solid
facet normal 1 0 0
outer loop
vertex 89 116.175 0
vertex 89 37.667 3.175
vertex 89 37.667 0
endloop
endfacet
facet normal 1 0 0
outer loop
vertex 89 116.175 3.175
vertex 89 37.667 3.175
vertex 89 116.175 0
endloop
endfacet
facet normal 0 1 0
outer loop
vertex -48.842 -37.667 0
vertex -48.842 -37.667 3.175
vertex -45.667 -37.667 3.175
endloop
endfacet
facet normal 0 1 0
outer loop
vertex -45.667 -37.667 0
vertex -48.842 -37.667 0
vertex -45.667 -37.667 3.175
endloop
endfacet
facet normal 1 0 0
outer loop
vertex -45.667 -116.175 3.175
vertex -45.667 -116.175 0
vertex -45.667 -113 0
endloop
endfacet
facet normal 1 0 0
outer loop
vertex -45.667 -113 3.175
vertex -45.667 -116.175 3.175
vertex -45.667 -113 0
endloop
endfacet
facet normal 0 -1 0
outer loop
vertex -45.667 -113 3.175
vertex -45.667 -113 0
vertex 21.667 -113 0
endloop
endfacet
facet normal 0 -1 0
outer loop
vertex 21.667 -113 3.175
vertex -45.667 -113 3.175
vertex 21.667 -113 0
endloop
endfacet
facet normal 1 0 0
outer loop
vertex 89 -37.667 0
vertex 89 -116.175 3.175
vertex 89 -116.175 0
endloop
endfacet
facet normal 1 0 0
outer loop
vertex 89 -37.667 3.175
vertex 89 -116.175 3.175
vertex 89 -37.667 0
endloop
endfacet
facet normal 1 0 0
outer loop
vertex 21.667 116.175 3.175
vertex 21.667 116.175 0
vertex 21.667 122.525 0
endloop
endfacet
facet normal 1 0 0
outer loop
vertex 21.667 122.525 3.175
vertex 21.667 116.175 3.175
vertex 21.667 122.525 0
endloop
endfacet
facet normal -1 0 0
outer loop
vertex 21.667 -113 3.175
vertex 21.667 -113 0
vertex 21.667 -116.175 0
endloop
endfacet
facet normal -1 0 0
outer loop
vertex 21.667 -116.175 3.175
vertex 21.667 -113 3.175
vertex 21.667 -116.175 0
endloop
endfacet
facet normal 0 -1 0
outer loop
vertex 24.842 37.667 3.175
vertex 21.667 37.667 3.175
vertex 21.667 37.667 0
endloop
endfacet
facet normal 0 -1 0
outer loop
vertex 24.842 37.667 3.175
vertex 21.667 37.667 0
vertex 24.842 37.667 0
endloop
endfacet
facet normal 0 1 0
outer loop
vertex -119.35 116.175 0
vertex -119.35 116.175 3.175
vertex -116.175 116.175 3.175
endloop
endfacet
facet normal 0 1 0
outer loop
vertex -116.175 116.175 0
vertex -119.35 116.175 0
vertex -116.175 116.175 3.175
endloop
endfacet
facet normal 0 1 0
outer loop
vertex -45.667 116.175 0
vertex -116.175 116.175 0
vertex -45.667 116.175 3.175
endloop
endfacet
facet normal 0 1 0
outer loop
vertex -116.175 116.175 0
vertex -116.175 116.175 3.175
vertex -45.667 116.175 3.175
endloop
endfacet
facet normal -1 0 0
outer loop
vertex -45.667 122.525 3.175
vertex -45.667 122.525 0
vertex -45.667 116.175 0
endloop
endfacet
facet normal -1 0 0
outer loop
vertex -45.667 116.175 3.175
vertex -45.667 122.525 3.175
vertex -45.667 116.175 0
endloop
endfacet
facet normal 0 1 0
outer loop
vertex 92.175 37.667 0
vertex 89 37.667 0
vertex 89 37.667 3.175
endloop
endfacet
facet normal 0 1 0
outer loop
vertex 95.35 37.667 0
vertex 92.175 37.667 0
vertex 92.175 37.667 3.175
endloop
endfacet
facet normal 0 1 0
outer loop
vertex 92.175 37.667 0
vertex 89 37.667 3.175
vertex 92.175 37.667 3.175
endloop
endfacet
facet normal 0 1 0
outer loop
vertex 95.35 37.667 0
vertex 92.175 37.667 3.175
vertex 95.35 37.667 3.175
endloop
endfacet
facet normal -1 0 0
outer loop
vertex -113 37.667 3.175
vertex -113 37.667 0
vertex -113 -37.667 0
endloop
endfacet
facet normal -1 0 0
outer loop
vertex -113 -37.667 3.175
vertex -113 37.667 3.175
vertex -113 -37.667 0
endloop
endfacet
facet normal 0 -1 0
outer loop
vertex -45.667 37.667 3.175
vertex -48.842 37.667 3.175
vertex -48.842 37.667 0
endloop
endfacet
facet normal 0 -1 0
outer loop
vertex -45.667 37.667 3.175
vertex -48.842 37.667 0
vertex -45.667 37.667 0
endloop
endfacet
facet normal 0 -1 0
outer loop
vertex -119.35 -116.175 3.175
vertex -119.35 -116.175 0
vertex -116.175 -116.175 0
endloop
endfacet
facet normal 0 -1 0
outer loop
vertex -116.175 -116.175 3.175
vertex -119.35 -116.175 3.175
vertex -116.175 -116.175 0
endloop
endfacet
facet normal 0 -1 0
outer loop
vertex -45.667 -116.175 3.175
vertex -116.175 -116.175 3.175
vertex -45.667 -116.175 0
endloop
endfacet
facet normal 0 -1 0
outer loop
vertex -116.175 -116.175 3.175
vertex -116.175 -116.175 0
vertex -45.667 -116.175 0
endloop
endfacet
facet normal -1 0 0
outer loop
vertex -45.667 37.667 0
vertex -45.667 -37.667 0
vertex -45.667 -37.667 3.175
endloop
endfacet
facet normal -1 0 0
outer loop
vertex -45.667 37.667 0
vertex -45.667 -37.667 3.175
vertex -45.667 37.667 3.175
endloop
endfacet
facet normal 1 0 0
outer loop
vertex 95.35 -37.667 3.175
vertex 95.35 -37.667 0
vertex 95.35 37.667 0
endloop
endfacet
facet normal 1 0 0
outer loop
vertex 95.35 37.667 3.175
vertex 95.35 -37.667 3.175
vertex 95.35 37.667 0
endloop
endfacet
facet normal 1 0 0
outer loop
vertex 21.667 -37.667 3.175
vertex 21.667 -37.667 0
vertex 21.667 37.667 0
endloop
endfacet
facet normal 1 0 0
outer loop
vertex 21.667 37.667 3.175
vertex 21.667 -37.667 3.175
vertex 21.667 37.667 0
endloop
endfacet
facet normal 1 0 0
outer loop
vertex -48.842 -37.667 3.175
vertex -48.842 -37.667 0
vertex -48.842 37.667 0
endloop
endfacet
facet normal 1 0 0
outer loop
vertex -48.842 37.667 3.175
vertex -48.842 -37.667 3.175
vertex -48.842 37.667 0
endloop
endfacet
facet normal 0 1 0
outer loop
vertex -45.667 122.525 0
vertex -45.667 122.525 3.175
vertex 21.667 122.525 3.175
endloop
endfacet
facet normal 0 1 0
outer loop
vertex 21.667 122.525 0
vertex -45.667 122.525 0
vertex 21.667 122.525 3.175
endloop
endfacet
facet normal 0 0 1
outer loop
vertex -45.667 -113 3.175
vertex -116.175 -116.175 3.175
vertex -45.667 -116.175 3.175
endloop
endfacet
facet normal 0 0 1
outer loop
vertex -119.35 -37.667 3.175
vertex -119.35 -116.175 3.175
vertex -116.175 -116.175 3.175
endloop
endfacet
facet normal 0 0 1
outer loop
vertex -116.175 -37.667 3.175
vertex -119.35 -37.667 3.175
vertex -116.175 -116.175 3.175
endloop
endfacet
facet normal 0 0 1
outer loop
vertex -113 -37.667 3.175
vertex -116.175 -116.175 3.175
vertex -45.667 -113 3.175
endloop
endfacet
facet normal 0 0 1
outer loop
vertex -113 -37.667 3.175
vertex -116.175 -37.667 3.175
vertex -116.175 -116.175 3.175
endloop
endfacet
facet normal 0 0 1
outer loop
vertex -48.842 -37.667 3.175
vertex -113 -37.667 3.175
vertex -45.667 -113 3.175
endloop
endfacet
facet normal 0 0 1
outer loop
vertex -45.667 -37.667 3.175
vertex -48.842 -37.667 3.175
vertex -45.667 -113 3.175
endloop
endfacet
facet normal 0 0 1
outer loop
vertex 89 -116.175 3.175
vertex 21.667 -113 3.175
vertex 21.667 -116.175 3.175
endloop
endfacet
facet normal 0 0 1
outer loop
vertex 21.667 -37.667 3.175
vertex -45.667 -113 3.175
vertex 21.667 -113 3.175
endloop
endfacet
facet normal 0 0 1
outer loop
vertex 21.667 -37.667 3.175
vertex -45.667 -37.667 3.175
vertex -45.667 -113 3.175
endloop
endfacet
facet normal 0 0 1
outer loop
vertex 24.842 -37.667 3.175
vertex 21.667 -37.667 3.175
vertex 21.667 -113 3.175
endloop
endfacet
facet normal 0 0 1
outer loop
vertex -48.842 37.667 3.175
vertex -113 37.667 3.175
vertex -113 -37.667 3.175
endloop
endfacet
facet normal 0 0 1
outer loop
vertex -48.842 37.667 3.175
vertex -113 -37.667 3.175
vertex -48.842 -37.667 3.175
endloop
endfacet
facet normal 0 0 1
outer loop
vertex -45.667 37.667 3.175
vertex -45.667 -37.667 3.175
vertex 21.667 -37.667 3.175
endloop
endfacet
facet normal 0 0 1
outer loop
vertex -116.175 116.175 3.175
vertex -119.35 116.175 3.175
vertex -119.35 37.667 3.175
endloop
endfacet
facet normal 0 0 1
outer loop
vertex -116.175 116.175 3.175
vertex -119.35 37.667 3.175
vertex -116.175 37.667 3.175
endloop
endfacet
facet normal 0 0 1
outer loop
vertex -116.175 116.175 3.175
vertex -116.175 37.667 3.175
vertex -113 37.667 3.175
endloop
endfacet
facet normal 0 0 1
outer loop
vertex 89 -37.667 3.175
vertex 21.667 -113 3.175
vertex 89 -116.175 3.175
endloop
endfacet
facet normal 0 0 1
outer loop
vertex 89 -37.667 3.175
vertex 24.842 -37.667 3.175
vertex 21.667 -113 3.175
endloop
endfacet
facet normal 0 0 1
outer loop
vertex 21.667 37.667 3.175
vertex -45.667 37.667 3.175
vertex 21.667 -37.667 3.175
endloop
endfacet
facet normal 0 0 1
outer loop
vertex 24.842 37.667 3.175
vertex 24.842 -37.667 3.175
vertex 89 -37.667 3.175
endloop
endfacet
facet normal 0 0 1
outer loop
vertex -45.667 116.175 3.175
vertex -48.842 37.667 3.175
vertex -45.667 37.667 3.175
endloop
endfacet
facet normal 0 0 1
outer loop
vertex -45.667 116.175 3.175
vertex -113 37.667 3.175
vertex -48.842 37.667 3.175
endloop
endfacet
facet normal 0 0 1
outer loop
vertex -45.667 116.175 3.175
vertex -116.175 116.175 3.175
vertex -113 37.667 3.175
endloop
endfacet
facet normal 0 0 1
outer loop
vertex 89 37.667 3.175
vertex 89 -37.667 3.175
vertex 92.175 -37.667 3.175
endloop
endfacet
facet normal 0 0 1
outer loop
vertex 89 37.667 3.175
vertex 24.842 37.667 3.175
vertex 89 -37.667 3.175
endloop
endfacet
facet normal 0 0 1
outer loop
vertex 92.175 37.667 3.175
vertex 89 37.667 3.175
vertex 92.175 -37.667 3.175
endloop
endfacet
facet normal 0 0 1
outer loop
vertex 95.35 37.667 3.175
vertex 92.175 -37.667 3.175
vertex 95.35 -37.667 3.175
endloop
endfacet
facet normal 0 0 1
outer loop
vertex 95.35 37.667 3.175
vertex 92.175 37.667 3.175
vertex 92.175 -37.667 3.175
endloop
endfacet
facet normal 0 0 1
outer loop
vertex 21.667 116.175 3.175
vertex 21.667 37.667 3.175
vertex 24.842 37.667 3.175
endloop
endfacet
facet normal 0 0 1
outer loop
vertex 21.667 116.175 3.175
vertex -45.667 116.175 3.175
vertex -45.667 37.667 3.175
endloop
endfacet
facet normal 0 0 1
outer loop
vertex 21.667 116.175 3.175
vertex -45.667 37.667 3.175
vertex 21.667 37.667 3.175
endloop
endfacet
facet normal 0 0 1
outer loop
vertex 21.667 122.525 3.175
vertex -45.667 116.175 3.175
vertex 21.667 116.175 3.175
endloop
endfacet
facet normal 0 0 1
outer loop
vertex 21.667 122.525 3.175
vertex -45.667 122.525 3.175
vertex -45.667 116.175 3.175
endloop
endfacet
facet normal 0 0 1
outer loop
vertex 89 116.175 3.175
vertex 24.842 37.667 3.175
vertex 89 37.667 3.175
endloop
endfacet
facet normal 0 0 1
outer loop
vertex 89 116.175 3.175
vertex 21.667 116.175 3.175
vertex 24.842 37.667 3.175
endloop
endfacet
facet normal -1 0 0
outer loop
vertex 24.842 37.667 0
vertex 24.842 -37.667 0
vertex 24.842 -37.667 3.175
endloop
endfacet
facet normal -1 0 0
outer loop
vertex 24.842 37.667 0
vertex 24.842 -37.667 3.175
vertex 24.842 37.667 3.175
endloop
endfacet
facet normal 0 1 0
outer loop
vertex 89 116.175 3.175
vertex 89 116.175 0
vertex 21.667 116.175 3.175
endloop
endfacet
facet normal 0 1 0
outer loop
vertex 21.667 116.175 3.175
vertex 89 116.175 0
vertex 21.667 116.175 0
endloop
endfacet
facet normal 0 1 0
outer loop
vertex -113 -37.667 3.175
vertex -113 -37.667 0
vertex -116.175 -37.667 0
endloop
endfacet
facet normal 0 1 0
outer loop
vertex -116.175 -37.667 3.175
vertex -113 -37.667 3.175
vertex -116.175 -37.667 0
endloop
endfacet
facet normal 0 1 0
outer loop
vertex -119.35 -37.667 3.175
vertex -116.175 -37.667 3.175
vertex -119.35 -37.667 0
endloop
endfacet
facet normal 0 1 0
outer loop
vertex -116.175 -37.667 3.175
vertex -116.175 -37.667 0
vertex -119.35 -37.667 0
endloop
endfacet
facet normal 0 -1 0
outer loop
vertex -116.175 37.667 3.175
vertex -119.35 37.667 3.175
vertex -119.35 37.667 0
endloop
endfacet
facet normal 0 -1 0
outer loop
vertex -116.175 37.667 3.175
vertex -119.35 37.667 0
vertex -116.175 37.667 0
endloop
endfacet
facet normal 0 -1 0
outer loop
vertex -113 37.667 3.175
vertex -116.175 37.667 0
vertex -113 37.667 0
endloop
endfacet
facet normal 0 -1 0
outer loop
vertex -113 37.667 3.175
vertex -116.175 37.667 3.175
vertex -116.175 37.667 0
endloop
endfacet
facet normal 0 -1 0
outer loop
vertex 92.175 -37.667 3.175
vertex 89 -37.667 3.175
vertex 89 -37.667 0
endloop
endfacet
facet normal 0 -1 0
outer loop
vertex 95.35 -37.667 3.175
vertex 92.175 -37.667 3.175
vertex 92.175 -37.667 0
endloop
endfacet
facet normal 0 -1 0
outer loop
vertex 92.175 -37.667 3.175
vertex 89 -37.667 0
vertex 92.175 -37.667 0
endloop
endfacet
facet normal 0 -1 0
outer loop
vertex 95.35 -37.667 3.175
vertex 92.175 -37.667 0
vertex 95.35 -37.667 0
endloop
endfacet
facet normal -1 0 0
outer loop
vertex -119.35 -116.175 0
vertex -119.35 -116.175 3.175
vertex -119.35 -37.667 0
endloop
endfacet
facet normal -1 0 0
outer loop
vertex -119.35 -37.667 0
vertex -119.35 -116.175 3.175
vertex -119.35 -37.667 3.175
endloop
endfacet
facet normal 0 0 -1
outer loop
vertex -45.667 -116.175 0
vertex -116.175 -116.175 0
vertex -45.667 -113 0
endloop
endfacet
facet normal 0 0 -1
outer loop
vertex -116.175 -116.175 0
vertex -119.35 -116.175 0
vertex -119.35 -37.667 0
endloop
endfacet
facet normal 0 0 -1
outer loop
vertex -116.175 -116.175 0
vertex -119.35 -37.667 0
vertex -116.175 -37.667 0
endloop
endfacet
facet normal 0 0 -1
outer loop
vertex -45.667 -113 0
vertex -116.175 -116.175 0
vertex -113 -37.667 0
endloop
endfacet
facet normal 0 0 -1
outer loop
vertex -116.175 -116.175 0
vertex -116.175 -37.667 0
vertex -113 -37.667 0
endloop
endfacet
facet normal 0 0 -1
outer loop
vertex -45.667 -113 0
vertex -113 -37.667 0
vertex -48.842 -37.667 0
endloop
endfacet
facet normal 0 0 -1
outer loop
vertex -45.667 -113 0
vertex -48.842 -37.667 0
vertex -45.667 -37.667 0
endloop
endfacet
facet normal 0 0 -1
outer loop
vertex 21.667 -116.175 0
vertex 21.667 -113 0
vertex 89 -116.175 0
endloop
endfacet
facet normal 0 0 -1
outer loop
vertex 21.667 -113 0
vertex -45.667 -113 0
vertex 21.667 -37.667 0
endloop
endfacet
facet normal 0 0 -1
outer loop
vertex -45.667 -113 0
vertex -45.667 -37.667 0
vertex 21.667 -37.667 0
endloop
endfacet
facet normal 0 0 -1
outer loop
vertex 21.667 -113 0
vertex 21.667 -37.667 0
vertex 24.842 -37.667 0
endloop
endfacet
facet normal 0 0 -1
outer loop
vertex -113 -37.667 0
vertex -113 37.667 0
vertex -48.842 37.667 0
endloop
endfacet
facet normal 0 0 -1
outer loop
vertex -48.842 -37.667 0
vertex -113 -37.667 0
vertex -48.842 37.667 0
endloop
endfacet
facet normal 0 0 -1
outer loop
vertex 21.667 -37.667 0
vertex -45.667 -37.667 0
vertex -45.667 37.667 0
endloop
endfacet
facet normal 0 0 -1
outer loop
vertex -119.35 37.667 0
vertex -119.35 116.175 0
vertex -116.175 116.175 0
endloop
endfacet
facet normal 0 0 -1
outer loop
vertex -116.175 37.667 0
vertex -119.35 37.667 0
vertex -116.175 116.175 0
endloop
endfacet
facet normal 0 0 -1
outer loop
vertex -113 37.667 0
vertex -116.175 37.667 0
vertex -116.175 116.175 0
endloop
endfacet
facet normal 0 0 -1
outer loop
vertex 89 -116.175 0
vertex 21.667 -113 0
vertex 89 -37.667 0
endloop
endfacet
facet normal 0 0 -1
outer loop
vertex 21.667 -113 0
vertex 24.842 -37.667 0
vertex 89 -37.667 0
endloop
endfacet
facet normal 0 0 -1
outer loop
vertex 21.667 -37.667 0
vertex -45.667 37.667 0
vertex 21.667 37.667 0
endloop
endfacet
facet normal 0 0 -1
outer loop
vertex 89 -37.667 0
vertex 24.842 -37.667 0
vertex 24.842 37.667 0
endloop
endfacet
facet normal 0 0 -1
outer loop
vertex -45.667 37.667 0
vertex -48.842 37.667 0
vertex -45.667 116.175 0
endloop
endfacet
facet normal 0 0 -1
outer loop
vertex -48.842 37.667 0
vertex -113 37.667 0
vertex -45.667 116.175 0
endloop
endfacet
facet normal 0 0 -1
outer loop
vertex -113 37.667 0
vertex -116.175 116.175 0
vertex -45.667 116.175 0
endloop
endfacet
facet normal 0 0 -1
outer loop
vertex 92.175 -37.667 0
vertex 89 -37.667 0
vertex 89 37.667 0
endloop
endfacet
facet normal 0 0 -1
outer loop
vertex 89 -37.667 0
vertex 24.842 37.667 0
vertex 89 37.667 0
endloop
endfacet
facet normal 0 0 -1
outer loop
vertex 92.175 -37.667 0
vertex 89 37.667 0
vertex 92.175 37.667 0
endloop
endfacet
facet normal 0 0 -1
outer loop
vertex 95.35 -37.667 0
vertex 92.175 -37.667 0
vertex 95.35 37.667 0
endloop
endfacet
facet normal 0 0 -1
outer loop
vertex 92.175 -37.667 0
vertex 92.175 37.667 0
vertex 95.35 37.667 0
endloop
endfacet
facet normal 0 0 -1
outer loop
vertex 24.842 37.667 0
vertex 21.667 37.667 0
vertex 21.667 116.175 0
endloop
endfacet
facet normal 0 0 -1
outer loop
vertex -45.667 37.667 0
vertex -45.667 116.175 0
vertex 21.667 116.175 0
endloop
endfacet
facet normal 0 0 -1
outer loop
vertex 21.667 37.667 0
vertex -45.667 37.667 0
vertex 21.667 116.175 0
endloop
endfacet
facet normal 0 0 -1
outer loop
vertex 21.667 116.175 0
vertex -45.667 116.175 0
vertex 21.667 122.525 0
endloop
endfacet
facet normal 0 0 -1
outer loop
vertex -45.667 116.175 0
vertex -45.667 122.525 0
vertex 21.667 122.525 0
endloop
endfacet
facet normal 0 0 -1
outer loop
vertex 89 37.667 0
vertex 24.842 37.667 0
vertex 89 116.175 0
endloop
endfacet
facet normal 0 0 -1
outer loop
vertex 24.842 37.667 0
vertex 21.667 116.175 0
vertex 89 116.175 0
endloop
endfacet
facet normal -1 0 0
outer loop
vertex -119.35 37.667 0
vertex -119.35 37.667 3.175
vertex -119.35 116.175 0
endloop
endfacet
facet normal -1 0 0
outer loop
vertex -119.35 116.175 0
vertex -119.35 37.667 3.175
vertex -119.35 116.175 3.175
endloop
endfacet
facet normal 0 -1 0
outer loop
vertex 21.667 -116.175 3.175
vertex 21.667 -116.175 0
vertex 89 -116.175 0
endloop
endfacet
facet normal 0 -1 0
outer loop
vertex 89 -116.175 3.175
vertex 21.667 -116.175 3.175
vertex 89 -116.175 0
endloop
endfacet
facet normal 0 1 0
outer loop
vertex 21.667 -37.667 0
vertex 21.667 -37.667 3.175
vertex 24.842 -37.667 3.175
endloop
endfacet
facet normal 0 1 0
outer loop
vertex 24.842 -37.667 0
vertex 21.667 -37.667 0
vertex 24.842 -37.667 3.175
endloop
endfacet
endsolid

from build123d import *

# Parameters (mm, degrees)
SKETCH2_W           = 3.175
SKETCH2_H           = 75.333333334
BOSS_EXTRUDE1_DEPTH = 3.175
SKETCH3_W           = 3.175
SKETCH3_H           = 78.508333333
SKETCH3_W_2         = 67.333333334
SKETCH3_H_2         = 3.175
BOSS_EXTRUDE2_DEPTH = 3.175
SKETCH4_W           = 3.175
SKETCH4_H           = 78.508333333
CUT_EXTRUDE1_DEPTH  = 3.175


with BuildPart() as part:
    # Sketch2 → Boss-Extrude1 (new body)
    with BuildSketch(Plane.XY):
        Polygon((-113, 37.666666667), (-113, -37.666666667), (-116.175, -37.666666667), (-116.175, -116.175), (-45.666666667, -116.175), (-45.666666667, -113), (21.666666667, -113), (21.666666667, -116.175), (92.175, -116.175), (92.175, -37.666666667), (95.35, -37.666666667), (95.35, 37.666666667), (92.175, 37.666666667), (92.175, 116.175), (21.666666667, 116.175), (21.666666667, 119.35), (-45.666666667, 119.35), (-45.666666667, 116.175), (-116.175, 116.175), (-116.175, 37.666666667), align=None)
        with Locations((23.254166667, 0)):
            Rectangle(SKETCH2_W, SKETCH2_H, mode=Mode.SUBTRACT)
        with Locations((-47.254166667, 0)):
            Rectangle(SKETCH2_W, SKETCH2_H, mode=Mode.SUBTRACT)
    extrude(amount=BOSS_EXTRUDE1_DEPTH)

    # Sketch3 → Boss-Extrude2 (add)
    with BuildSketch(Plane.XY.offset(3.175)):
        with Locations((-117.7625, 76.920833334)):
            Rectangle(SKETCH3_W, SKETCH3_H)
        with Locations((-117.7625, -76.920833334)):
            Rectangle(SKETCH3_W, SKETCH3_H)
        with Locations((-12, 120.9375)):
            Rectangle(SKETCH3_W_2, SKETCH3_H_2)
    extrude(amount=-BOSS_EXTRUDE2_DEPTH)

    # Sketch4 → Cut-Extrude1 (cut)
    with BuildSketch(Plane.XY.offset(3.175)):
        with Locations((90.5875, 76.920833334)):
            Rectangle(SKETCH4_W, SKETCH4_H)
        with Locations((90.5875, -76.920833334)):
            Rectangle(SKETCH4_W, SKETCH4_H)
    extrude(amount=-CUT_EXTRUDE1_DEPTH, mode=Mode.SUBTRACT)


solid = part.part
